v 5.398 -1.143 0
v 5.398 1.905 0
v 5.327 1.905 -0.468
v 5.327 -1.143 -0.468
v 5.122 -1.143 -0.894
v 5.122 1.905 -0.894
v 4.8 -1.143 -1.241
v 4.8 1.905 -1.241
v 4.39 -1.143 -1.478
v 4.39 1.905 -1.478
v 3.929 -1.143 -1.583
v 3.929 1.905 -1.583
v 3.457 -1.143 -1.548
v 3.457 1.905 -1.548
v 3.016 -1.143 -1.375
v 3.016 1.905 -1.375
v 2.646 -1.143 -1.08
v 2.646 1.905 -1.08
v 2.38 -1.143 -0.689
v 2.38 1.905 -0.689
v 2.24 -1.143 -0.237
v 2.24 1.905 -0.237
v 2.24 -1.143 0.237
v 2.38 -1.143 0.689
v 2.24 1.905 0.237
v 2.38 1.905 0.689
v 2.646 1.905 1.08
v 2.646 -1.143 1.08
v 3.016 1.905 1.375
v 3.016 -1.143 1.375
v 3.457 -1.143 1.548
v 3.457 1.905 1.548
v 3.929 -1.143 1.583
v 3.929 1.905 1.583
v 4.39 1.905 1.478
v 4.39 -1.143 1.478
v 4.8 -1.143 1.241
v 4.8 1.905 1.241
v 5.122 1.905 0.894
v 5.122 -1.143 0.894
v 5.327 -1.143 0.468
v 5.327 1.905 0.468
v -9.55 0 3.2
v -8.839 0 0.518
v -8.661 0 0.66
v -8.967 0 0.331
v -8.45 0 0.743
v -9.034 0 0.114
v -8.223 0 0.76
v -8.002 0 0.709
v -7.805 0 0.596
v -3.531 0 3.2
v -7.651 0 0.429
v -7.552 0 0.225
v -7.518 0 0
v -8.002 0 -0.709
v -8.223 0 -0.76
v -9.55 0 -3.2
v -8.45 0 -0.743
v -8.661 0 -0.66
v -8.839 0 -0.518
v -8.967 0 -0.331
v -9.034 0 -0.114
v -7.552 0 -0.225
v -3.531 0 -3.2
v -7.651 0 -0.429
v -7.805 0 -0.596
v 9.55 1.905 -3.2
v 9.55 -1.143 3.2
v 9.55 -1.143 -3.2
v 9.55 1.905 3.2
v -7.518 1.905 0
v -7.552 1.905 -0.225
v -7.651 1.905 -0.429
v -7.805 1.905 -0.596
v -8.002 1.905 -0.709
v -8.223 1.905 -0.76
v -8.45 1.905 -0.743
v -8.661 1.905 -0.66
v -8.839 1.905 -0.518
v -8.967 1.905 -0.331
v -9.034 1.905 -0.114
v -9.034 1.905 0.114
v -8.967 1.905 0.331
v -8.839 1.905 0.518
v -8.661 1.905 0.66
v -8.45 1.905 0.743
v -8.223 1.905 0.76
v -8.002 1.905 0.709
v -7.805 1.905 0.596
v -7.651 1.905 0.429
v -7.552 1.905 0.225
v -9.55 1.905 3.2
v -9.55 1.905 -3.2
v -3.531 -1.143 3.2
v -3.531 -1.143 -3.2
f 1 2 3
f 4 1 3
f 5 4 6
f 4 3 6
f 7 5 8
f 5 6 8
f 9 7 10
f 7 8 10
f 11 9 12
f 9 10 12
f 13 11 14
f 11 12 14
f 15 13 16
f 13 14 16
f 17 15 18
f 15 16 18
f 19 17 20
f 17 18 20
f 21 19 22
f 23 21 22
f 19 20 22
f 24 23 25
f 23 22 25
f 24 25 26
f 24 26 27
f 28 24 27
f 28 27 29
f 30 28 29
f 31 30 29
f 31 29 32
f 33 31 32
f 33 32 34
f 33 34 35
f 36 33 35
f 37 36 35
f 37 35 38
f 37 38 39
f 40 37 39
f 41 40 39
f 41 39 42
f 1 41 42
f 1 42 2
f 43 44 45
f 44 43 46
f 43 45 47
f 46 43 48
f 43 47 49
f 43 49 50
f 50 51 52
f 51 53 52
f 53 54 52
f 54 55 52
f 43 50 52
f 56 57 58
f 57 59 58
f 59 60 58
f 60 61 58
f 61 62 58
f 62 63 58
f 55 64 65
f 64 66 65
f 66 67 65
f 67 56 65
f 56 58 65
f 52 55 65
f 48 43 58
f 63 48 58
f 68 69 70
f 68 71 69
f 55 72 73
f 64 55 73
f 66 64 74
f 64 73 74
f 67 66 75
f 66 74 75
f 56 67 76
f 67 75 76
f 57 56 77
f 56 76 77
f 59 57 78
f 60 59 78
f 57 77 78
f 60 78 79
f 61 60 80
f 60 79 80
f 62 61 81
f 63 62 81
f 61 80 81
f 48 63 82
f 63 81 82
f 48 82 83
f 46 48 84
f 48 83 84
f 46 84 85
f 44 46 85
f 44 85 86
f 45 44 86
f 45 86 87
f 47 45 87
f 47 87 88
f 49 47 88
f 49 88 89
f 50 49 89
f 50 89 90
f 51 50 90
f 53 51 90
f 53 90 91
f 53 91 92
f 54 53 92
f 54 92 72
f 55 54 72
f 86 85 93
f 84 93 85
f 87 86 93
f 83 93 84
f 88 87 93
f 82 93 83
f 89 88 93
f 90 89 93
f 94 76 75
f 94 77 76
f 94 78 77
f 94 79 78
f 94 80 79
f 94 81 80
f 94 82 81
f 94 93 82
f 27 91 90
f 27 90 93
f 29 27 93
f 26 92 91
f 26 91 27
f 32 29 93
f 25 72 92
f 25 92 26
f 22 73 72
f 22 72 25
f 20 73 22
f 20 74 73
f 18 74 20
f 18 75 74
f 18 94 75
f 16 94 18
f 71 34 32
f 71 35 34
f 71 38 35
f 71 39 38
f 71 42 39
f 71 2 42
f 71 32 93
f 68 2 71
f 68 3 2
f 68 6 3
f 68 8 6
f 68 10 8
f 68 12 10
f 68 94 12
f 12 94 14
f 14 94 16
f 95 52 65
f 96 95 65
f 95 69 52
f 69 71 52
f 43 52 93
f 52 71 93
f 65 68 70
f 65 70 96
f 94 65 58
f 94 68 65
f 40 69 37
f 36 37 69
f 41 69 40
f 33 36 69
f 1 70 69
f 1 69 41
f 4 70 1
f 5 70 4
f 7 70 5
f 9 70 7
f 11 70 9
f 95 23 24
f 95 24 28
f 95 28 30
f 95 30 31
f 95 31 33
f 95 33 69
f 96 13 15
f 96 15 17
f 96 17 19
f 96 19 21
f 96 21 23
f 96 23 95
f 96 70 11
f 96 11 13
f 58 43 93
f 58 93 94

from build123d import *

# Parameters (mm, degrees)
SKETCH1_W           = 19.1008
SKETCH1_H           = 6.4008
BOSS_EXTRUDE1_DEPTH = 1.905
SKETCH2_W           = 13.081
SKETCH2_H           = 6.4008
BOSS_EXTRUDE2_DEPTH = 1.143
CUT_EXTRUDE1_REACH  = 5.048
SKETCH3_R           = 0.762
CUT_EXTRUDE2_REACH  = 5.048
SKETCH4_R           = 1.5875


with BuildPart() as part:
    # Sketch1 → Boss-Extrude1 (new body)
    with BuildSketch(Plane(origin=(0, 0, 0), x_dir=(1, 0, 0), z_dir=(0, 1, 0))):
        Rectangle(SKETCH1_W, SKETCH1_H)
    extrude(amount=BOSS_EXTRUDE1_DEPTH)

    # Sketch2 → Boss-Extrude2 (add)
    with BuildSketch(Plane(origin=(0, 0, 0), x_dir=(-1, 0, 0), z_dir=(0, -1, 0))):
        with Locations((-3.0099, 0)):
            Rectangle(SKETCH2_W, SKETCH2_H)
    extrude(amount=BOSS_EXTRUDE2_DEPTH)

    # Sketch3 → Cut-Extrude1 (cut, up to next)
    with BuildSketch(Plane(origin=(0, 1.905, 0), x_dir=(1, 0, 0), z_dir=(0, 1, 0)), mode=Mode.PRIVATE) as cut_extrude1_sk1:
        with Locations((-8.2804, 0)):
            Circle(SKETCH3_R)
    cut_extrude1_tool1 = extrude(cut_extrude1_sk1.sketch, amount=-CUT_EXTRUDE1_REACH, mode=Mode.PRIVATE) & part.part
    add(cut_extrude1_tool1.solids().sort_by_distance((-8.2804, 1.905, 0))[0], mode=Mode.SUBTRACT)

    # Sketch4 → Cut-Extrude2 (cut, up to next)
    with BuildSketch(Plane(origin=(0, 1.905, 0), x_dir=(1, 0, 0), z_dir=(0, 1, 0)), mode=Mode.PRIVATE) as cut_extrude2_sk1:
        with Locations((3.81, 0)):
            Circle(SKETCH4_R)
    cut_extrude2_tool1 = extrude(cut_extrude2_sk1.sketch, amount=-CUT_EXTRUDE2_REACH, mode=Mode.PRIVATE) & part.part
    add(cut_extrude2_tool1.solids().sort_by_distance((3.81, 1.905, 0))[0], mode=Mode.SUBTRACT)


solid = part.part
